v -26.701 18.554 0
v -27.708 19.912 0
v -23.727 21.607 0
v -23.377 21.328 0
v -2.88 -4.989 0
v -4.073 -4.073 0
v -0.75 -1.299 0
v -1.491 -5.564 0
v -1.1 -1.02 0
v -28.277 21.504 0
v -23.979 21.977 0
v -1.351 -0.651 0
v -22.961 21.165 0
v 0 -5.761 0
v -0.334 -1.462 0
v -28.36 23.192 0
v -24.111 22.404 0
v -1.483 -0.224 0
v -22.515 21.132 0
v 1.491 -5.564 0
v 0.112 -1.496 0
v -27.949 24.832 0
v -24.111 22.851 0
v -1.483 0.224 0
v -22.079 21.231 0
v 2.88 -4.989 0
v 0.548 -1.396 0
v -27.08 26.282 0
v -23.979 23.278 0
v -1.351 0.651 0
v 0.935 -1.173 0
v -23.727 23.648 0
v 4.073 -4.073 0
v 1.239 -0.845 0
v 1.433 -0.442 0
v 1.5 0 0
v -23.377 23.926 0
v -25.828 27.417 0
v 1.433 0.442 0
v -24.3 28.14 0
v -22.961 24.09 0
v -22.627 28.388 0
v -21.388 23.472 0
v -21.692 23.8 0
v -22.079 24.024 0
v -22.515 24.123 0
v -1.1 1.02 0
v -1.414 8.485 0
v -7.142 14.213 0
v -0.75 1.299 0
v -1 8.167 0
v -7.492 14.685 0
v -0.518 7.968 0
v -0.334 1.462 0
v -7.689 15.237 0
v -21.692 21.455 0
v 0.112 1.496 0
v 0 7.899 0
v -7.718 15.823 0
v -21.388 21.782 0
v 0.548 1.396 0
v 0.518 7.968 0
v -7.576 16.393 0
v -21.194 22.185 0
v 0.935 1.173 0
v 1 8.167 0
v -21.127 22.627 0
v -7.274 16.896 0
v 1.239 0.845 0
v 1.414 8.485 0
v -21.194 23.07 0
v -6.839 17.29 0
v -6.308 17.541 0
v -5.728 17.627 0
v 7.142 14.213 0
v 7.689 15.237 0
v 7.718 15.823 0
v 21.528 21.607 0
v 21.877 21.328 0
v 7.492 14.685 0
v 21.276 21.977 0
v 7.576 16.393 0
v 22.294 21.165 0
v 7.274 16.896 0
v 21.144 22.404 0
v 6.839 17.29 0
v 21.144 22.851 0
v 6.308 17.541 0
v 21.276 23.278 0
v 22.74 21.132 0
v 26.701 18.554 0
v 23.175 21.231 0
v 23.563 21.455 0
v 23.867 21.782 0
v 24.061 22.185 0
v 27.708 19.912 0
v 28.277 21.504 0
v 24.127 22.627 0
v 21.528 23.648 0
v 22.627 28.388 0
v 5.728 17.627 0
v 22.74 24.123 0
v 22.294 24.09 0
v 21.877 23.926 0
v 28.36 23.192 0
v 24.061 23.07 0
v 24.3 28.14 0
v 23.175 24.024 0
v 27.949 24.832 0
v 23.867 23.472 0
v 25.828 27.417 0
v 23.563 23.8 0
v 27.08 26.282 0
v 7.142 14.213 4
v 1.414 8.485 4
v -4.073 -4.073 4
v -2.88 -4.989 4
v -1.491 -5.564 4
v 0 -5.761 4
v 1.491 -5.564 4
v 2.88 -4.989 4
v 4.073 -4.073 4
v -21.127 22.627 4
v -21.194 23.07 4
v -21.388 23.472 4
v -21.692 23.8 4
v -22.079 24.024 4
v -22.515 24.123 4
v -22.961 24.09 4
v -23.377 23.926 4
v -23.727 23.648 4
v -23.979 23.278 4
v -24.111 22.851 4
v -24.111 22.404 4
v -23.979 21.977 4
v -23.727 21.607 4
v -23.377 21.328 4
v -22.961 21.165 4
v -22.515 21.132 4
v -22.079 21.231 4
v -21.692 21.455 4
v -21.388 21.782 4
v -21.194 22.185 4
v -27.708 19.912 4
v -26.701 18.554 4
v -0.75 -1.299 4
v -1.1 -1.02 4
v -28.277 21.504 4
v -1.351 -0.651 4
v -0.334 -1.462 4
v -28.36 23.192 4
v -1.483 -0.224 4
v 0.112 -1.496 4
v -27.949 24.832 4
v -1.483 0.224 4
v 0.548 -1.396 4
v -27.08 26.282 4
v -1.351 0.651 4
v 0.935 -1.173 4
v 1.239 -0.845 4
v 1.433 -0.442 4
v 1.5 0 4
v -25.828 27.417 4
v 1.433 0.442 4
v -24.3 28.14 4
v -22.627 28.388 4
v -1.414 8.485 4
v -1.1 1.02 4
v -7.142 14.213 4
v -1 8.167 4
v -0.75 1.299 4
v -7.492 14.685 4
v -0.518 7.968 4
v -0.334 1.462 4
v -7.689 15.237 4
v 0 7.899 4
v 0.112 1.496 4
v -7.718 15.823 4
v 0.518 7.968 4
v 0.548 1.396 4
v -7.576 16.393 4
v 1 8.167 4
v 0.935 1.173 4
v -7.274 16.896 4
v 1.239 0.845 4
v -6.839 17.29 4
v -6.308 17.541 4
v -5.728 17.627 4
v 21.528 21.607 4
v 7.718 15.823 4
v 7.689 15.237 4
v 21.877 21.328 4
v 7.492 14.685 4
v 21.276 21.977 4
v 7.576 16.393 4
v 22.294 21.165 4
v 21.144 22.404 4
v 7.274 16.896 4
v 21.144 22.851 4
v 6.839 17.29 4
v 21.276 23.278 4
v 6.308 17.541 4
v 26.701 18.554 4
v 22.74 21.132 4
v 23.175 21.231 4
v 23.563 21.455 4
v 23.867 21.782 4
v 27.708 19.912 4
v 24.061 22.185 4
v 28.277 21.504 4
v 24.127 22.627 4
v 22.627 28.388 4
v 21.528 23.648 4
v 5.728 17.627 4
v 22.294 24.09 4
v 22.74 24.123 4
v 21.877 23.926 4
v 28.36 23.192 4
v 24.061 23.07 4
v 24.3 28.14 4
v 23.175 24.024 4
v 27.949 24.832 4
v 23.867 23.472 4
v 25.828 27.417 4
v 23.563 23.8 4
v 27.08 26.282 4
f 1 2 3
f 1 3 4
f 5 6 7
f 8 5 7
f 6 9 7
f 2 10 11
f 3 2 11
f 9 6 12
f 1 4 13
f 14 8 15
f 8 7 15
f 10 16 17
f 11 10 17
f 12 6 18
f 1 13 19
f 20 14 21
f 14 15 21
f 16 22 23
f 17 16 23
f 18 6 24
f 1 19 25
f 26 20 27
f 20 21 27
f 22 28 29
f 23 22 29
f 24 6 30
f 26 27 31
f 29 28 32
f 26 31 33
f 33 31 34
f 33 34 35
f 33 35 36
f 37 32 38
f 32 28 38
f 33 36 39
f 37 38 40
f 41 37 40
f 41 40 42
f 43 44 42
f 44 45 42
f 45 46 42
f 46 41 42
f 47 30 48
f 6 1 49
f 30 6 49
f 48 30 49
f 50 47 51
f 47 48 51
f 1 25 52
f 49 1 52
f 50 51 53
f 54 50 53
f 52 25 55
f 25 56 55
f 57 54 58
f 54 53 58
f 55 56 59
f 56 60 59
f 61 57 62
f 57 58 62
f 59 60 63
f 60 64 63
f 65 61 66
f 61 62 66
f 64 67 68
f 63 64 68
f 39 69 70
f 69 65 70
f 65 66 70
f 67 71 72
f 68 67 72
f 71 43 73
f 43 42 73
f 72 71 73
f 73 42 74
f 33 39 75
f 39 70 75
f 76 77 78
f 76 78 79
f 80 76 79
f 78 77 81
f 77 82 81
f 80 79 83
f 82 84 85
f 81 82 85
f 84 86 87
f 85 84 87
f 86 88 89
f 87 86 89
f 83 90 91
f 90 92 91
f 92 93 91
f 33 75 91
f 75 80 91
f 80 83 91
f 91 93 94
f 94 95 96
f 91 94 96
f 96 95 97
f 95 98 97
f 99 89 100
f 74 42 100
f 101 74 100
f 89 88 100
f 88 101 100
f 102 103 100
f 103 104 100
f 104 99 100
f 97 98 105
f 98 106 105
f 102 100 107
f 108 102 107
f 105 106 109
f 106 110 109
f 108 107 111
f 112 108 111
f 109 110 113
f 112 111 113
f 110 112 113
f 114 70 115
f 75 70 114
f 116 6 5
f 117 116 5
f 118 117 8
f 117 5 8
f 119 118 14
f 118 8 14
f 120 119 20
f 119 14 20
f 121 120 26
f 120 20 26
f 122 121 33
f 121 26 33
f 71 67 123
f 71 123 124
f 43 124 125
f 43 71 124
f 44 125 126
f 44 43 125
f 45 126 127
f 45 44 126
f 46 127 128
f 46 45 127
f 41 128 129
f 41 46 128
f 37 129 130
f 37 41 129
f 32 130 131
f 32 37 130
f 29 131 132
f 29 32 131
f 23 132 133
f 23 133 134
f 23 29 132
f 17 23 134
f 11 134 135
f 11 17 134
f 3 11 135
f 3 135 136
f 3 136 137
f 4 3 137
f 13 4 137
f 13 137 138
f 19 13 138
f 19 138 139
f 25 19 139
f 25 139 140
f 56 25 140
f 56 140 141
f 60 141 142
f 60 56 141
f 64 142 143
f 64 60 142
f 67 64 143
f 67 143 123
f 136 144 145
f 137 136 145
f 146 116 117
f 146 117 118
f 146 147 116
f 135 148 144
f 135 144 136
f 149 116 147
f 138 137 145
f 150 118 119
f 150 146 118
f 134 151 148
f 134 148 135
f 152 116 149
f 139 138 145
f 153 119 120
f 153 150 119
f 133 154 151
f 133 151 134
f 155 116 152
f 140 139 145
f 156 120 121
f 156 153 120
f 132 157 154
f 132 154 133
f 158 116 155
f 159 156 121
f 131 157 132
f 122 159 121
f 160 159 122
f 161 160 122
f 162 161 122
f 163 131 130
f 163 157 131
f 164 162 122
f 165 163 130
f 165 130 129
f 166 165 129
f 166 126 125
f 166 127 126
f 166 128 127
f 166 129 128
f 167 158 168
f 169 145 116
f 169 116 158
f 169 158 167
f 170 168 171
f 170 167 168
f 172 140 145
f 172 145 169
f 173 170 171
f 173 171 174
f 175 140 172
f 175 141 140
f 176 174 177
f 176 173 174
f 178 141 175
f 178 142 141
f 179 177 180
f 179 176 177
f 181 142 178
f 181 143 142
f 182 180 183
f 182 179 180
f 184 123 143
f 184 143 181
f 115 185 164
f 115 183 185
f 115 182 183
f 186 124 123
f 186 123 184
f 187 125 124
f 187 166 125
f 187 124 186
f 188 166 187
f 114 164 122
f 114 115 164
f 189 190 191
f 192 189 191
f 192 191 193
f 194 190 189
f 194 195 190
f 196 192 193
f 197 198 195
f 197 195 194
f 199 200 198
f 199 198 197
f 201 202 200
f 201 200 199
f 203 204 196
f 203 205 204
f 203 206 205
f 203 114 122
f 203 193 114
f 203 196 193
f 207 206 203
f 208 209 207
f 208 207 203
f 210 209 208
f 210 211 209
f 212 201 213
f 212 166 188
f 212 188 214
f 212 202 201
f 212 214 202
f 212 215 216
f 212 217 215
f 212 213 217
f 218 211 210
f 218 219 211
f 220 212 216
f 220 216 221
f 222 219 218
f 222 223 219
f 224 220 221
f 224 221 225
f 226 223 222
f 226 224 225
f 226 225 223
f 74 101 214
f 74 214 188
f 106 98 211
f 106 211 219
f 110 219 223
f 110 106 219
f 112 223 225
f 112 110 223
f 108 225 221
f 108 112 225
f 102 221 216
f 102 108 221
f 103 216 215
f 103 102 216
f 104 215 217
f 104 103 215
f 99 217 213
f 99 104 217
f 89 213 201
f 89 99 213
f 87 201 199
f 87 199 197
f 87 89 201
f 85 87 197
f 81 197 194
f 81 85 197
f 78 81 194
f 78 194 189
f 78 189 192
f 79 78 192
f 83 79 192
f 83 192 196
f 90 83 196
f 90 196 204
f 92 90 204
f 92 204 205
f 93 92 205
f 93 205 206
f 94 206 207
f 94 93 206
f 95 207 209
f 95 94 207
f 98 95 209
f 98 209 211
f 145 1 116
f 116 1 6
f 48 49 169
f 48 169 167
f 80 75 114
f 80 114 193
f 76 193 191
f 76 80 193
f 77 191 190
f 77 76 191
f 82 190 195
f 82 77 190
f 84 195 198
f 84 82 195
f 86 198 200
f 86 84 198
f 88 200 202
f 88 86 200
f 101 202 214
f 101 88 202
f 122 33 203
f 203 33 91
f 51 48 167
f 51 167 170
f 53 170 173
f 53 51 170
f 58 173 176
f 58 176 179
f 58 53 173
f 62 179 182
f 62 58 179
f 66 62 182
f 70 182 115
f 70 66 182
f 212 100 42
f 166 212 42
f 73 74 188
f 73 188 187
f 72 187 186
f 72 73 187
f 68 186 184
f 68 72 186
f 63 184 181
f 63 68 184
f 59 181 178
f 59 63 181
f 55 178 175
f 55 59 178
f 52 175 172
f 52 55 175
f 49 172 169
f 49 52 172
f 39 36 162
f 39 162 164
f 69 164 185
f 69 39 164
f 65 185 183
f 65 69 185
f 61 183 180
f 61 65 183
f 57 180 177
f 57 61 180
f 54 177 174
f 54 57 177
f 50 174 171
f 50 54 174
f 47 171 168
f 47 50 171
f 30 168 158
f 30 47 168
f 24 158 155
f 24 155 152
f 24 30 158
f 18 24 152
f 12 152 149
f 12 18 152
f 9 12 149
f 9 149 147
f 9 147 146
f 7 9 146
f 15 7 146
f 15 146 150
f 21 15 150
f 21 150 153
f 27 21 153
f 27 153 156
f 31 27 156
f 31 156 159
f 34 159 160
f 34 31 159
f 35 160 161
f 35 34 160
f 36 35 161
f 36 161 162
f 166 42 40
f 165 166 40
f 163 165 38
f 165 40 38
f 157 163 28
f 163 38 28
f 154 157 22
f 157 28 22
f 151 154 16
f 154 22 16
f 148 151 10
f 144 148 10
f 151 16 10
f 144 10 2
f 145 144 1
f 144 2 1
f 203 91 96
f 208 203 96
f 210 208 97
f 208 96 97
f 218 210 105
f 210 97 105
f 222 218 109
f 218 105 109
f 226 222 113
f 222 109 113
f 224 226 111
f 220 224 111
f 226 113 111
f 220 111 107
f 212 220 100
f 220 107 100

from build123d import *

# Parameters (mm, degrees)
SCHIZZO1_R                   = 1.5
ESTRUSIONE_ESTRUSIONE1_DEPTH = 4


with BuildPart() as part:
    # Schizzo1 → Estrusione-Estrusione1 (new body)
    with BuildSketch(Plane.XY):
        with BuildLine():
            Line((22.627416998, 28.387976608), (-22.627416998, 28.387976608))
            ThreePointArc((-22.627416998, 28.387976608), (-27.949480117, 24.831887722), (-26.700747761, 18.554086235))
            Line((-26.700747761, 18.554086235), (-4.073330763, -4.073330763))
            ThreePointArc((-4.073330763, -4.073330763), (0, -5.76055961), (4.073330763, -4.073330763))
            Line((4.073330763, -4.073330763), (26.700747761, 18.554086235))
            ThreePointArc((26.700747761, 18.554086235), (27.949480117, 24.831887722), (22.627416998, 28.387976608))
        make_face()
        Circle(SCHIZZO1_R, mode=Mode.SUBTRACT)
        with Locations((22.627416998, 22.627416998)):
            Circle(SCHIZZO1_R, mode=Mode.SUBTRACT)
        with Locations((-22.627416998, 22.627416998)):
            Circle(SCHIZZO1_R, mode=Mode.SUBTRACT)
        with BuildLine():
            Line((5.727922061, 17.627416998), (-5.727922061, 17.627416998))
            ThreePointArc((-5.727922061, 17.627416998), (-7.575681126, 16.392783863), (-7.142135624, 14.213203436))
            Line((-7.142135624, 14.213203436), (-1.414213562, 8.485281374))
            ThreePointArc((-1.414213562, 8.485281374), (0, 7.899494937), (1.414213562, 8.485281374))
            Line((1.414213562, 8.485281374), (7.142135624, 14.213203436))
            ThreePointArc((7.142135624, 14.213203436), (7.575681126, 16.392783863), (5.727922061, 17.627416998))
        make_face(mode=Mode.SUBTRACT)
    extrude(amount=ESTRUSIONE_ESTRUSIONE1_DEPTH)


solid = part.part
